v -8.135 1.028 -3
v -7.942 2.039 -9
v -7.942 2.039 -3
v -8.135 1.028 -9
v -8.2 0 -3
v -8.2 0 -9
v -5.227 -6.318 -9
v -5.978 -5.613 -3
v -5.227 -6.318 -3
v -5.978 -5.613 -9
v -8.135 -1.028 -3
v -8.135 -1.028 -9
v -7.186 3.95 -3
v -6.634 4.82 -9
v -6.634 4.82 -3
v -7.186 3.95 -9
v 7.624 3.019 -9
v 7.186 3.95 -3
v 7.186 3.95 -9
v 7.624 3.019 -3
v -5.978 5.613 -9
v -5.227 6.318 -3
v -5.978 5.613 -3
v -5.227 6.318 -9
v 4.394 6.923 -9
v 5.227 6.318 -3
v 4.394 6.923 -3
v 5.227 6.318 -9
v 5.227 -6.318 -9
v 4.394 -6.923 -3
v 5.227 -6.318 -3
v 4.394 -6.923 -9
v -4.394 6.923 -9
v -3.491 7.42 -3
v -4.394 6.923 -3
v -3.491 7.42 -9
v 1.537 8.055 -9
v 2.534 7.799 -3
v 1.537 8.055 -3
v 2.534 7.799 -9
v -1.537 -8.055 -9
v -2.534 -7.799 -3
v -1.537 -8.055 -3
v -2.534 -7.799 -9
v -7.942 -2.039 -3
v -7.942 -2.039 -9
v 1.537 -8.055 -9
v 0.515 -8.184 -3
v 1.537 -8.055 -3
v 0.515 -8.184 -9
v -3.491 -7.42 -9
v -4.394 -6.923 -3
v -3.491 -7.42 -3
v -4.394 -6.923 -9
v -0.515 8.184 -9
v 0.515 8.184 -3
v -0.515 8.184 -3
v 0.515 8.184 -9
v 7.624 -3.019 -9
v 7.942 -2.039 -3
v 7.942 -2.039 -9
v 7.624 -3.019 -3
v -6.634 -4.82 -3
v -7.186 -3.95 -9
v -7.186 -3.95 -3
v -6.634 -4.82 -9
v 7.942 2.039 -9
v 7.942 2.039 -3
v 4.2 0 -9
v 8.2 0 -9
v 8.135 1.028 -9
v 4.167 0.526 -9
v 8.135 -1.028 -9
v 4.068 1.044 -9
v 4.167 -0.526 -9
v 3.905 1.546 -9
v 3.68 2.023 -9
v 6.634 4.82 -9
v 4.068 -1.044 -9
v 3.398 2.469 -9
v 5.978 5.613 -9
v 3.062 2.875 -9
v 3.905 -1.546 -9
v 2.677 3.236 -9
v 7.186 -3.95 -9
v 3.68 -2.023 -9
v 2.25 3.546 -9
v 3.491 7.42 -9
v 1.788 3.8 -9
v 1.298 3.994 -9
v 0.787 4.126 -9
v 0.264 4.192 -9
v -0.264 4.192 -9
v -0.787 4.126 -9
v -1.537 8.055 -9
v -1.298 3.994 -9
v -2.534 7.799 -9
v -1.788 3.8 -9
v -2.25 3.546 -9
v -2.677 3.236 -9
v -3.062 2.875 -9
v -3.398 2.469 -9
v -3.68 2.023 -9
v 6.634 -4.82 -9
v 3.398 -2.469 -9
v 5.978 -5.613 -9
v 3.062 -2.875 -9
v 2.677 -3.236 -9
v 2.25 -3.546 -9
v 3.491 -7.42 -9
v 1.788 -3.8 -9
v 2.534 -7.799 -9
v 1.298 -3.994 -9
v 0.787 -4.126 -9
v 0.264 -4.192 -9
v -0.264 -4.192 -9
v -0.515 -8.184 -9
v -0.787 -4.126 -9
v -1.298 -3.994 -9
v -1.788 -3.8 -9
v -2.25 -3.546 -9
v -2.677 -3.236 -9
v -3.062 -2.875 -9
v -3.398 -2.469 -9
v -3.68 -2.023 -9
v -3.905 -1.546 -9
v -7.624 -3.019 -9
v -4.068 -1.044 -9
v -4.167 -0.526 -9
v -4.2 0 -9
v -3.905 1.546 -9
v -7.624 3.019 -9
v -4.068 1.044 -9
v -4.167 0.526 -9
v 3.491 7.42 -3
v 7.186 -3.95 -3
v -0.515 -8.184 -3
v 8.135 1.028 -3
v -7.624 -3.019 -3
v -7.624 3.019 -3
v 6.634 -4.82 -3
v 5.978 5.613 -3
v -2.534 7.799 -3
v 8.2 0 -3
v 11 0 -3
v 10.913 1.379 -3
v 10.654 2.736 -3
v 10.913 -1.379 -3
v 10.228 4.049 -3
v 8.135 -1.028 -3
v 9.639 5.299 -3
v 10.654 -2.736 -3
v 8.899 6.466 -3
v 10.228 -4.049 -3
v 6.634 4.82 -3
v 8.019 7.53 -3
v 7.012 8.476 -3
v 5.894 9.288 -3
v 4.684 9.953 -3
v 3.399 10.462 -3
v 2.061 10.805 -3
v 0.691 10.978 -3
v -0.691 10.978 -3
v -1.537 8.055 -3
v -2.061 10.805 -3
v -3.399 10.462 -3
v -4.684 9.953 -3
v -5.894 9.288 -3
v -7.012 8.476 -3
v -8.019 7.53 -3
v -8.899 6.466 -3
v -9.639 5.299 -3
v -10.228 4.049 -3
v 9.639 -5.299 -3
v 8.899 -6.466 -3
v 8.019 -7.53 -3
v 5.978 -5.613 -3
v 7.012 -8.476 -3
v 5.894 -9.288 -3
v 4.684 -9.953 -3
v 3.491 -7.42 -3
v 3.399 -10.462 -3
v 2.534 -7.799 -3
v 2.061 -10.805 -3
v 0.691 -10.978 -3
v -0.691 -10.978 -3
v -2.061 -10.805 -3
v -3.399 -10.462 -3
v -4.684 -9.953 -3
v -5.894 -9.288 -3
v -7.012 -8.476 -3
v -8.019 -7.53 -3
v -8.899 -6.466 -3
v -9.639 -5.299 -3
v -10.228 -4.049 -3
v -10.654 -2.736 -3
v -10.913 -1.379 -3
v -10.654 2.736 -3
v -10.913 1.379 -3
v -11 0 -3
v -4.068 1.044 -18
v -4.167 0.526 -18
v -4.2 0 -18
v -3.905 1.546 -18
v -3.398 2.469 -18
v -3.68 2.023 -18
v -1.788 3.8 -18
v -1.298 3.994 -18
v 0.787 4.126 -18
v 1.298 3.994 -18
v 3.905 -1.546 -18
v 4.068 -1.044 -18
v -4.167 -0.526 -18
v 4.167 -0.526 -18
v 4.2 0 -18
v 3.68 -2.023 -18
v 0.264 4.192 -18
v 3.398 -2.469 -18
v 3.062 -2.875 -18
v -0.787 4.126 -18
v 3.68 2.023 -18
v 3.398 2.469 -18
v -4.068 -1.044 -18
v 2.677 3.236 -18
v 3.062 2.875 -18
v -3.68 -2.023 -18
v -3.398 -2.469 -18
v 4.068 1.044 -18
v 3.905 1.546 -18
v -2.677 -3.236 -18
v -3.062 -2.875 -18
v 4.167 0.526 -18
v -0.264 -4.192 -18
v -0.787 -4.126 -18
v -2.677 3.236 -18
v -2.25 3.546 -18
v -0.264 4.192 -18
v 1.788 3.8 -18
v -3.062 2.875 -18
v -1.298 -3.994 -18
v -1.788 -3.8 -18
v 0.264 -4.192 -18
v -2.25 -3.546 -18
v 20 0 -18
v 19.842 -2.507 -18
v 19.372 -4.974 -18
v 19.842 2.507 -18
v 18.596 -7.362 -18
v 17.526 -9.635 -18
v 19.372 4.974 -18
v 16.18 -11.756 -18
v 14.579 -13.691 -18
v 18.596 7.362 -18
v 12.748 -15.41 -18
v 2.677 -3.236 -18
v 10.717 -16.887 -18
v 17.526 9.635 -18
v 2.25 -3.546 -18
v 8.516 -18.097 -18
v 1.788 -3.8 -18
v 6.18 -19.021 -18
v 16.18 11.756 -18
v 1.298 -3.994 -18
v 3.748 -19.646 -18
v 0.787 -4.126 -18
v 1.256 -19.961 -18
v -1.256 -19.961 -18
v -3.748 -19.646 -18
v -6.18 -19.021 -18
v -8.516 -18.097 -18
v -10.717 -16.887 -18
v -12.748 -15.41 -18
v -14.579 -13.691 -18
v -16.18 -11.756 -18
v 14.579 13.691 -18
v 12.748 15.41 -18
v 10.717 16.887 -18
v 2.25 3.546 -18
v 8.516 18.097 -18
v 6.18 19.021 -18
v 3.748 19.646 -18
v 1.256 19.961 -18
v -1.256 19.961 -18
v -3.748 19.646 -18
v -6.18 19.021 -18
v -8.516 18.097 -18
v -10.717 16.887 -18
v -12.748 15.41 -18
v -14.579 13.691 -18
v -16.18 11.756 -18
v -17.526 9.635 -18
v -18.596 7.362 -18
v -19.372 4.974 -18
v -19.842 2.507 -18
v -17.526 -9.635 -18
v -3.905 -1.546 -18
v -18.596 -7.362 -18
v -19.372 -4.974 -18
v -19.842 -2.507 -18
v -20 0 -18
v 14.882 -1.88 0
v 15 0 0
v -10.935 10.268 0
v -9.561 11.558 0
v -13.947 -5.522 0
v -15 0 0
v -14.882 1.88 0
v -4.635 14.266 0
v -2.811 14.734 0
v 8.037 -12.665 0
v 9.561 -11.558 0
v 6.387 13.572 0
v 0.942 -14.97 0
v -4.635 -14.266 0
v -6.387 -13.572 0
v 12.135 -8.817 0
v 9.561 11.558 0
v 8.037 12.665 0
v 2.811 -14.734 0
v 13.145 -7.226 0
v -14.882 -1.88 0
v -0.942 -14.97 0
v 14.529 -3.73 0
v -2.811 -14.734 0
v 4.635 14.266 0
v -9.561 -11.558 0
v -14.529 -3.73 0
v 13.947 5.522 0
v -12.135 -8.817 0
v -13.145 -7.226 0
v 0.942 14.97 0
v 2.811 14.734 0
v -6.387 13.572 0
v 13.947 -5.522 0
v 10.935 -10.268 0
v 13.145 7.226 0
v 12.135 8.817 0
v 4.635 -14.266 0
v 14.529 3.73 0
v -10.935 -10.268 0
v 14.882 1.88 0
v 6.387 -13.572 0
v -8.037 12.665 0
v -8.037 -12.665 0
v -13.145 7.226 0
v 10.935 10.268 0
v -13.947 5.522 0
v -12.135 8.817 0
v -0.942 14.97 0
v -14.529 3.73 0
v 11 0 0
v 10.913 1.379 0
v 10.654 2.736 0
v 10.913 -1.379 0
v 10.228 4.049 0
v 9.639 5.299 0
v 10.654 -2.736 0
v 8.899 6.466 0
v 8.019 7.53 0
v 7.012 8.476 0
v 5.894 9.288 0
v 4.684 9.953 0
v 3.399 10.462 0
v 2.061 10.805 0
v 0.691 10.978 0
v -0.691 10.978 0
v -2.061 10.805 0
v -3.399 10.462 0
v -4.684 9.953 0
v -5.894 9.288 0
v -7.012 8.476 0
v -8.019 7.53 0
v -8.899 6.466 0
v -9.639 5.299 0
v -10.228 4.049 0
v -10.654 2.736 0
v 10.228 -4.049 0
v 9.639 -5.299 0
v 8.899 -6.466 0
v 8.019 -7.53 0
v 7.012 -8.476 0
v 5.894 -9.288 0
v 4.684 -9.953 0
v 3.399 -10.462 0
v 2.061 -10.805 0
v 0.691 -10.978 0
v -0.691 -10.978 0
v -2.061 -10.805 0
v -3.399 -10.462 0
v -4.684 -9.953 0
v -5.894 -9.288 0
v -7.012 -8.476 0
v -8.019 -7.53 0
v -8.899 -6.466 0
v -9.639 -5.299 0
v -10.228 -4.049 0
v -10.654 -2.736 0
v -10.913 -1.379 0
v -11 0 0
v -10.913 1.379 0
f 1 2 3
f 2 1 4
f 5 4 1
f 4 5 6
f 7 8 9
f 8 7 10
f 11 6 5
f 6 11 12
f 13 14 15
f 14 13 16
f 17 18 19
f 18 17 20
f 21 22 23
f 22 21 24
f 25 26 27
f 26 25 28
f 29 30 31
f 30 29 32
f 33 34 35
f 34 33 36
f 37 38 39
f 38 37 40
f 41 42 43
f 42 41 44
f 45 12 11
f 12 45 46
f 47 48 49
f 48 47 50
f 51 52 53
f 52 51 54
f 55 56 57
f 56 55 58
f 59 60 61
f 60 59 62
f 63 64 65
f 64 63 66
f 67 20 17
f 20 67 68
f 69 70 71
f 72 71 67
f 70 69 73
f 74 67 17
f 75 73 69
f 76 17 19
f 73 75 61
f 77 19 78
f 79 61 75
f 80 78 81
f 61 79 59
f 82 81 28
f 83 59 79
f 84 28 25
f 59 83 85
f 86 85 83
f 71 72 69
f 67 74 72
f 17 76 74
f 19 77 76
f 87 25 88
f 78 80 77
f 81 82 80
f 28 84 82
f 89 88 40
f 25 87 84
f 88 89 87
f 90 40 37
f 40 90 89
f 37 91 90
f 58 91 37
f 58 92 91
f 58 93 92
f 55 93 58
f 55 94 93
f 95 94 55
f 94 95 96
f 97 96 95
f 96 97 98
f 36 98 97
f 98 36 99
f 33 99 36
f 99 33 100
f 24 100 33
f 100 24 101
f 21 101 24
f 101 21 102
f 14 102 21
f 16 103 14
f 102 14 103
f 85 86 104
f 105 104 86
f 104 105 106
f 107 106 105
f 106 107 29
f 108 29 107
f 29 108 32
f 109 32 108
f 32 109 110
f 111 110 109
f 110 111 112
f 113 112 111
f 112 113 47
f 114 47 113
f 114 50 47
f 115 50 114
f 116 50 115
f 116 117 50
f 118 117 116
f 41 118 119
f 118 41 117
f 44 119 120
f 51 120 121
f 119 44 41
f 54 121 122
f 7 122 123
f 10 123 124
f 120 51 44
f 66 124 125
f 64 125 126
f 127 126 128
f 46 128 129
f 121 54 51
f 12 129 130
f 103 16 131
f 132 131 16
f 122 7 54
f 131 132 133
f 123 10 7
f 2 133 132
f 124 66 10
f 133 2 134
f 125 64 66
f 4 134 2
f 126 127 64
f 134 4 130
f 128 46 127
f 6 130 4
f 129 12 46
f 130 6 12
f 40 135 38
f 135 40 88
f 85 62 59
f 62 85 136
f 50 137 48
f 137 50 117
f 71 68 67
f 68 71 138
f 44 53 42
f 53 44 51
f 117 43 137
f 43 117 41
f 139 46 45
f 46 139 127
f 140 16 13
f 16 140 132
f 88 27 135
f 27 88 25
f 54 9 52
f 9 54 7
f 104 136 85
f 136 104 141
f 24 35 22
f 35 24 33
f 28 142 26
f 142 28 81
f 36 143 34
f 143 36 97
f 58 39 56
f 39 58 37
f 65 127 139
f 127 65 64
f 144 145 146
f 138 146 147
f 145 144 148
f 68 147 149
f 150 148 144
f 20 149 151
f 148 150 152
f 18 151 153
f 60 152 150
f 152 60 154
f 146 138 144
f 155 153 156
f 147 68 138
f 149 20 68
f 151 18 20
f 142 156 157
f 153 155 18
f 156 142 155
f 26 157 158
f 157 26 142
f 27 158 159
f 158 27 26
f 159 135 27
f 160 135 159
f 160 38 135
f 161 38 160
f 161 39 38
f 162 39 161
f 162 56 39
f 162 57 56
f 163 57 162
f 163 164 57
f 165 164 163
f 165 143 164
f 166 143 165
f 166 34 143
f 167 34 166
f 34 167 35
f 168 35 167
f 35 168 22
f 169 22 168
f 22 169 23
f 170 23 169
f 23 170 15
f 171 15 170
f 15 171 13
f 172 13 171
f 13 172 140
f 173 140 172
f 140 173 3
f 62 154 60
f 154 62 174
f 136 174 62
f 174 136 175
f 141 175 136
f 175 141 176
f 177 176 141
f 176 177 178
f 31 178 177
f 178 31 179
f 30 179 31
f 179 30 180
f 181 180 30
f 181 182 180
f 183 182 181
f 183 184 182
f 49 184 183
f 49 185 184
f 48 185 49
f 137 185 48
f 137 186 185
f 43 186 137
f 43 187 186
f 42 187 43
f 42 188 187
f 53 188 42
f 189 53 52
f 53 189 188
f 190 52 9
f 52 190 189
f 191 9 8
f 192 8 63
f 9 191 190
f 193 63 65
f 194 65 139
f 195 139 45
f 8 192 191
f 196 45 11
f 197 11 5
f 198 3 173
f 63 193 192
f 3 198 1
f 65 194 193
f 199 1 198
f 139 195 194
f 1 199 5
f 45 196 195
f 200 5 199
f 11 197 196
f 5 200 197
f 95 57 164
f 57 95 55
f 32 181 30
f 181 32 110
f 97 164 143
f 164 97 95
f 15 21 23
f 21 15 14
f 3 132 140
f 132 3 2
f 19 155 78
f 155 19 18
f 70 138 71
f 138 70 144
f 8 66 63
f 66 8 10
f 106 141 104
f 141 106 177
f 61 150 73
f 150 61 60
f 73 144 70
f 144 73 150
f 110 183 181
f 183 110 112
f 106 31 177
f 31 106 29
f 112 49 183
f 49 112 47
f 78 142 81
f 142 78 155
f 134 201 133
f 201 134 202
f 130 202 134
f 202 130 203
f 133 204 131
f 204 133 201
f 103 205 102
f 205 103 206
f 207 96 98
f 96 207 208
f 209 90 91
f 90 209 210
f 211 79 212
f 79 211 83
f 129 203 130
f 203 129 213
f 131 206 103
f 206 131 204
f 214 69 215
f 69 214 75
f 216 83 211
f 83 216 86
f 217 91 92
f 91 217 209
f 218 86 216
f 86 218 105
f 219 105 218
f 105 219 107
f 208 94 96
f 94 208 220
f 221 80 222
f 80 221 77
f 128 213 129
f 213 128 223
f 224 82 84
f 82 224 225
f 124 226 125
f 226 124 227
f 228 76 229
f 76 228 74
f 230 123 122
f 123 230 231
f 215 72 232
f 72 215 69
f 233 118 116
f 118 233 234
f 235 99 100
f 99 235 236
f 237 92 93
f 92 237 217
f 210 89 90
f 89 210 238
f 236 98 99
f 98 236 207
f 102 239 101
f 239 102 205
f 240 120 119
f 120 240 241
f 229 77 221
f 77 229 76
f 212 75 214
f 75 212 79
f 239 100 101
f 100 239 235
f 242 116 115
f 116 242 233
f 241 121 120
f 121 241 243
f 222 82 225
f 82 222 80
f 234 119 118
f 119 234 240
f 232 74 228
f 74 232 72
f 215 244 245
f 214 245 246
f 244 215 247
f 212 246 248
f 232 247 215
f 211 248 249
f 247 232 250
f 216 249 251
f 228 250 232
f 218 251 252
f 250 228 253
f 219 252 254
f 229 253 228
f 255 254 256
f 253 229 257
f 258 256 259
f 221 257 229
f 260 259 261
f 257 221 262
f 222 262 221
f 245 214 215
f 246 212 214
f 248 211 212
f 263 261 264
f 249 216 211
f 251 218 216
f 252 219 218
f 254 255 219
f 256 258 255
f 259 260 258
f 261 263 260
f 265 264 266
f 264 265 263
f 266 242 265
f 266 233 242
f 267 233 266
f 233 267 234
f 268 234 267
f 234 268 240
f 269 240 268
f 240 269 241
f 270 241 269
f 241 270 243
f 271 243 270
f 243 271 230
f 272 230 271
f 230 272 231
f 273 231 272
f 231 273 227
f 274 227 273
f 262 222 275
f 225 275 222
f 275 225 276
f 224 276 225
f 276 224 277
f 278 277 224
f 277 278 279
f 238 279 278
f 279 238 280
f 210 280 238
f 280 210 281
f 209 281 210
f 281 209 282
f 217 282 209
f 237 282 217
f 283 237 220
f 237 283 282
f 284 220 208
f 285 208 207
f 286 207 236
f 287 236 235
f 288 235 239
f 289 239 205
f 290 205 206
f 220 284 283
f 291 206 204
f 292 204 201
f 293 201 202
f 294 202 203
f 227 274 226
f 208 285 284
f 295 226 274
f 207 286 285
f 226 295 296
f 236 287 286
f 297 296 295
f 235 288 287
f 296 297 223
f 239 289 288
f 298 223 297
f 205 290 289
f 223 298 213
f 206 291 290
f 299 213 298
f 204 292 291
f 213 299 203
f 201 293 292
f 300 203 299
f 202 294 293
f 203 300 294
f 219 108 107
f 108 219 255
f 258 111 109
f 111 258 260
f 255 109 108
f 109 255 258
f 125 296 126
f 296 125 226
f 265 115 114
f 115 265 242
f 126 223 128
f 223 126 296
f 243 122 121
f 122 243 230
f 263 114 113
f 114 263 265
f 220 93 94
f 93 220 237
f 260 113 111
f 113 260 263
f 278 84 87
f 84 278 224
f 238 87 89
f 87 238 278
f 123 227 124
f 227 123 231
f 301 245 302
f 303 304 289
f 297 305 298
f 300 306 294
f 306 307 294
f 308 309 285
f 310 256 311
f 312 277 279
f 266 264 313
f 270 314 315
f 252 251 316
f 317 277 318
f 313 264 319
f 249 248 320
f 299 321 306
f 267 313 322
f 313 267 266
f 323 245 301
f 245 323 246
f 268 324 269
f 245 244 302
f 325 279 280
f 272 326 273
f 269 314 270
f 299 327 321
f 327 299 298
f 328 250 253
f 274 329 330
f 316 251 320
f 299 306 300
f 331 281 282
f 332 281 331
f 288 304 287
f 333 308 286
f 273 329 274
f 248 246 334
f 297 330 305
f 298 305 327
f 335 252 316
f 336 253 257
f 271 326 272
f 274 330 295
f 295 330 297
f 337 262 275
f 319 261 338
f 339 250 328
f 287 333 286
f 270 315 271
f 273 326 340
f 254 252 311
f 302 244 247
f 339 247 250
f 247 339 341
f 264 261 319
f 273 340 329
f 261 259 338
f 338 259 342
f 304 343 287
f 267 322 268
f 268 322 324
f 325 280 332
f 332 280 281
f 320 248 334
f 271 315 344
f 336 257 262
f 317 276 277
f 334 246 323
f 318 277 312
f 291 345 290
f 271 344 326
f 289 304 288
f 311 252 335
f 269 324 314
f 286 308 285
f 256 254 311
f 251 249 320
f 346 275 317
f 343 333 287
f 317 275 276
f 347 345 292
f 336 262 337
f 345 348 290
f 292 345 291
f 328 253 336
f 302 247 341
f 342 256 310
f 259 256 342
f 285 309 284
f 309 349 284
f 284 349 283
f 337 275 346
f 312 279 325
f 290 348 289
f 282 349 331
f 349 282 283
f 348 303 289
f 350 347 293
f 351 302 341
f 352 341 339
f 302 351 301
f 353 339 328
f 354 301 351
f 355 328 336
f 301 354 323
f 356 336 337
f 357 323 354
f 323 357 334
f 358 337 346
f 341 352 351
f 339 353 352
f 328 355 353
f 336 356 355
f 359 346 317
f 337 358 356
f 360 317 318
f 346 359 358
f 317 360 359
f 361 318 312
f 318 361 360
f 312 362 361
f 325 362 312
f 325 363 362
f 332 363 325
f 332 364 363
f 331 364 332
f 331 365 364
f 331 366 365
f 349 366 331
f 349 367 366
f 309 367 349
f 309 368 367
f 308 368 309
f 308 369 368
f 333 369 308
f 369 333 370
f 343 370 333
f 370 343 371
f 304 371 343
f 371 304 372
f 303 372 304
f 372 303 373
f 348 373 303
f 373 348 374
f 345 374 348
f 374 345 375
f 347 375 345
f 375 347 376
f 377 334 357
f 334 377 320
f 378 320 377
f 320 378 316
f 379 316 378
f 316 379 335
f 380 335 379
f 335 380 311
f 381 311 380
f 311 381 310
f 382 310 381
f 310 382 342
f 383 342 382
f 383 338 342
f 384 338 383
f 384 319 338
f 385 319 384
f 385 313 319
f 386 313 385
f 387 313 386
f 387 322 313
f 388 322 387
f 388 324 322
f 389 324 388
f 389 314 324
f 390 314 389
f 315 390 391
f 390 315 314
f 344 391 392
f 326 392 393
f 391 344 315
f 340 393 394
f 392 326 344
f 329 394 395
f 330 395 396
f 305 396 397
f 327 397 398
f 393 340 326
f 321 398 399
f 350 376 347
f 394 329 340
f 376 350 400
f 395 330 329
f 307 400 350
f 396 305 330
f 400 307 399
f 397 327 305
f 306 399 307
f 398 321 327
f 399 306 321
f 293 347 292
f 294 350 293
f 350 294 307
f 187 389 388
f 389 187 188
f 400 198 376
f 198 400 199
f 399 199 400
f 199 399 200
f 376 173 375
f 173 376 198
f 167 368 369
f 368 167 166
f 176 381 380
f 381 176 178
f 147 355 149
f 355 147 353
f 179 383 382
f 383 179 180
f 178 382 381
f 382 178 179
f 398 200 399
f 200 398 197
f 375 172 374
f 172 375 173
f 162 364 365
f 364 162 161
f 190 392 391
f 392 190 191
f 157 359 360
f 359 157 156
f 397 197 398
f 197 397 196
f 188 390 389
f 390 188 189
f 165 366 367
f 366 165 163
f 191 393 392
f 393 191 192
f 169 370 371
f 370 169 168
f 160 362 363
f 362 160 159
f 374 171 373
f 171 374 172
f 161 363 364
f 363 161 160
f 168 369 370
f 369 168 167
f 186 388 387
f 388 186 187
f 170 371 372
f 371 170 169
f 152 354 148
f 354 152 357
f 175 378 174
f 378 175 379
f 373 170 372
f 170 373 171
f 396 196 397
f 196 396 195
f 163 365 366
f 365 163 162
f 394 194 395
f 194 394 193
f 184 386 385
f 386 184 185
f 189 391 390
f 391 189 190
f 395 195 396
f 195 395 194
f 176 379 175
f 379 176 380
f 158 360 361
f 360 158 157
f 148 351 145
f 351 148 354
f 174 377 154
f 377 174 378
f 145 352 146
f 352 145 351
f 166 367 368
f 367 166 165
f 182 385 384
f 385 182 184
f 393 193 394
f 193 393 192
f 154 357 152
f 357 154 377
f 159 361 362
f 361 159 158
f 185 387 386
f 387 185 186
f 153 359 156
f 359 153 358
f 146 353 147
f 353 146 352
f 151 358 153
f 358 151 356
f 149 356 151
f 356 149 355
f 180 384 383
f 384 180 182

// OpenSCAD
// Screw Fastened Foot
// by Nathan Wittstock <nate@fardog.io>

/* [Foot Dimensions] */
foot_lower_radius = 15;
foot_upper_radius = 20;
foot_height = 18;

/* [Inset] */
foot_inset_radius = 4;
foot_inset_depth = 3;

/* [Screw] */
foot_screw_radius = 4;
foot_screw_inset = 6;
foot_screw_head_radius = 8;

/* [Misc] */
tolerance = 0.2;
resolution = 50;

/* [Hidden] */
$fn=resolution;

rotate([0, 180, 0]) // rotate for better view in customizer
difference() {
    cylinder(r1=foot_lower_radius, r2=foot_upper_radius, h=foot_height);
    cylinder(r=foot_lower_radius-foot_inset_radius, h=foot_inset_depth);
    union() {
        translate([0, 0, foot_inset_depth])
            cylinder(r=foot_screw_head_radius+tolerance, h=foot_screw_inset);
        cylinder(r=foot_screw_radius+tolerance, h=foot_height);
    }
}
